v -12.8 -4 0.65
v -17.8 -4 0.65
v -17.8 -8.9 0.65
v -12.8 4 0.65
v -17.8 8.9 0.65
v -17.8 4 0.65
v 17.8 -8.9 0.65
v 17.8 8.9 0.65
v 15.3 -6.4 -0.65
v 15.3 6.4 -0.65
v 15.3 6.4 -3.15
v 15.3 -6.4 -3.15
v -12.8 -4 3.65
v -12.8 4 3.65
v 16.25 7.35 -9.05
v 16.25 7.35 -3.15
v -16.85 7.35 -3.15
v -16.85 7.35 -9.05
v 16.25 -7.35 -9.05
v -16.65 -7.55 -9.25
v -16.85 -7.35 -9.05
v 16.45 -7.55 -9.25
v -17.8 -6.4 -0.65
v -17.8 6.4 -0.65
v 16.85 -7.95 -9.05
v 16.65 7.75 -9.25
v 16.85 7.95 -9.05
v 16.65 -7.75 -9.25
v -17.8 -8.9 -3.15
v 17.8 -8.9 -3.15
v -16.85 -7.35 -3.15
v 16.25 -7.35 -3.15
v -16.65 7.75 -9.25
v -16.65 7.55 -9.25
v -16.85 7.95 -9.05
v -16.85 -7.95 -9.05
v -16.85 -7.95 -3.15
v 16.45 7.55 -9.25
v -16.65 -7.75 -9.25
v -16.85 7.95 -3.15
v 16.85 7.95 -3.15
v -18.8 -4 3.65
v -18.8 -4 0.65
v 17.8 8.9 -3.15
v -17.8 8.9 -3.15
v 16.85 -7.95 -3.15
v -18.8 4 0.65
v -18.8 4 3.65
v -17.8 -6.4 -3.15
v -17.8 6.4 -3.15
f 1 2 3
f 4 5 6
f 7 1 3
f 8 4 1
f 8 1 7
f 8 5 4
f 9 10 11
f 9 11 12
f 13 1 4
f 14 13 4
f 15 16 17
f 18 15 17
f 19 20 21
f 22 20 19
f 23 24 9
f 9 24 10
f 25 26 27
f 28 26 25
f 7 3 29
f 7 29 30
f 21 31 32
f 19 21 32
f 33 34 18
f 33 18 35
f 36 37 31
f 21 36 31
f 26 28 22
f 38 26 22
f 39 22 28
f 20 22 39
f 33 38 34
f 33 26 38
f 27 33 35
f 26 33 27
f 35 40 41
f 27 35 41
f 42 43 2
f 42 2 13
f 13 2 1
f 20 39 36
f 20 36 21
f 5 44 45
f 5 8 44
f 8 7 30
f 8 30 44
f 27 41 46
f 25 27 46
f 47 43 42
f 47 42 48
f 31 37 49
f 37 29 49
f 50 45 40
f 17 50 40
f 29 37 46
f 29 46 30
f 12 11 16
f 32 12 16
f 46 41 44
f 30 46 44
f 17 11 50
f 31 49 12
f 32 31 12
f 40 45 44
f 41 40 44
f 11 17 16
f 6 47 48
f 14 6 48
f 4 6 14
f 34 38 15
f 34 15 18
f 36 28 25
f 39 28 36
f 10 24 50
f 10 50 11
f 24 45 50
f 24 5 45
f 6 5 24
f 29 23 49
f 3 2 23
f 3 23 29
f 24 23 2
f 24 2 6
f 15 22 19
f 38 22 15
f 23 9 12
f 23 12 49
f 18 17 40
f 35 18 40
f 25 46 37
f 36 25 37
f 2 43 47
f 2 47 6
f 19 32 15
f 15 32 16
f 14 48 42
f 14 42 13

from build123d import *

# Parameters (mm, degrees)
SKETCH1_W           = 35.6
SKETCH1_H           = 17.8
BOSS_EXTRUDE1_DEPTH = 0.65
SKETCH2_W           = 6
SKETCH2_H           = 8
BOSS_EXTRUDE2_DEPTH = 3
BOSS_EXTRUDE3_DEPTH = 2.5
BOSS_EXTRUDE4_DEPTH = 6.1
CHAMFER1_SIZE       = 0.2


with BuildPart() as part:
    # Sketch1 → Boss-Extrude1 (new, symmetric)
    with BuildSketch(Plane.XY):
        Rectangle(SKETCH1_W, SKETCH1_H)
    extrude(amount=BOSS_EXTRUDE1_DEPTH, both=True)

    # Sketch2 → Boss-Extrude2 (add)
    with BuildSketch(Plane.XY.offset(0.65)):
        with Locations((-15.8, 0)):
            Rectangle(SKETCH2_W, SKETCH2_H)
    extrude(amount=BOSS_EXTRUDE2_DEPTH)

    # Sketch3 → Boss-Extrude3 (add)
    with BuildSketch(Plane(origin=(0, 0, -0.65), x_dir=(-1, 0, 0), z_dir=(0, 0, -1))):
        Polygon((17.8, 6.4), (-15.3, 6.4), (-15.3, -6.4), (17.8, -6.4), (17.8, -8.9), (-17.8, -8.9), (-17.8, 8.9), (17.8, 8.9), align=None)
    extrude(amount=BOSS_EXTRUDE3_DEPTH)

    # Sketch4 → Boss-Extrude4 (add)
    with BuildSketch(Plane(origin=(0, 0, -3.15), x_dir=(-1, 0, 0), z_dir=(0, 0, -1))):
        Polygon((16.85, -7.95), (16.85, -7.35), (-16.25, -7.35), (-16.25, 7.35), (16.85, 7.35), (16.85, 7.95), (-16.85, 7.95), (-16.85, -7.95), align=None)
    extrude(amount=BOSS_EXTRUDE4_DEPTH)

    # Chamfer1
    chamfer1_edges = [part.edges().sort_by_distance(p)[0] for p in [
        (0, -7.95, -9.25),
        (-16.85, -7.65, -9.25),
        (-0.3, -7.35, -9.25),
        (16.25, 0, -9.25),
        (-0.3, 7.35, -9.25),
        (-16.85, 7.65, -9.25),
        (0, 7.95, -9.25),
        (16.85, 0, -9.25),
    ]]
    chamfer(chamfer1_edges, length=CHAMFER1_SIZE)


solid = part.part
